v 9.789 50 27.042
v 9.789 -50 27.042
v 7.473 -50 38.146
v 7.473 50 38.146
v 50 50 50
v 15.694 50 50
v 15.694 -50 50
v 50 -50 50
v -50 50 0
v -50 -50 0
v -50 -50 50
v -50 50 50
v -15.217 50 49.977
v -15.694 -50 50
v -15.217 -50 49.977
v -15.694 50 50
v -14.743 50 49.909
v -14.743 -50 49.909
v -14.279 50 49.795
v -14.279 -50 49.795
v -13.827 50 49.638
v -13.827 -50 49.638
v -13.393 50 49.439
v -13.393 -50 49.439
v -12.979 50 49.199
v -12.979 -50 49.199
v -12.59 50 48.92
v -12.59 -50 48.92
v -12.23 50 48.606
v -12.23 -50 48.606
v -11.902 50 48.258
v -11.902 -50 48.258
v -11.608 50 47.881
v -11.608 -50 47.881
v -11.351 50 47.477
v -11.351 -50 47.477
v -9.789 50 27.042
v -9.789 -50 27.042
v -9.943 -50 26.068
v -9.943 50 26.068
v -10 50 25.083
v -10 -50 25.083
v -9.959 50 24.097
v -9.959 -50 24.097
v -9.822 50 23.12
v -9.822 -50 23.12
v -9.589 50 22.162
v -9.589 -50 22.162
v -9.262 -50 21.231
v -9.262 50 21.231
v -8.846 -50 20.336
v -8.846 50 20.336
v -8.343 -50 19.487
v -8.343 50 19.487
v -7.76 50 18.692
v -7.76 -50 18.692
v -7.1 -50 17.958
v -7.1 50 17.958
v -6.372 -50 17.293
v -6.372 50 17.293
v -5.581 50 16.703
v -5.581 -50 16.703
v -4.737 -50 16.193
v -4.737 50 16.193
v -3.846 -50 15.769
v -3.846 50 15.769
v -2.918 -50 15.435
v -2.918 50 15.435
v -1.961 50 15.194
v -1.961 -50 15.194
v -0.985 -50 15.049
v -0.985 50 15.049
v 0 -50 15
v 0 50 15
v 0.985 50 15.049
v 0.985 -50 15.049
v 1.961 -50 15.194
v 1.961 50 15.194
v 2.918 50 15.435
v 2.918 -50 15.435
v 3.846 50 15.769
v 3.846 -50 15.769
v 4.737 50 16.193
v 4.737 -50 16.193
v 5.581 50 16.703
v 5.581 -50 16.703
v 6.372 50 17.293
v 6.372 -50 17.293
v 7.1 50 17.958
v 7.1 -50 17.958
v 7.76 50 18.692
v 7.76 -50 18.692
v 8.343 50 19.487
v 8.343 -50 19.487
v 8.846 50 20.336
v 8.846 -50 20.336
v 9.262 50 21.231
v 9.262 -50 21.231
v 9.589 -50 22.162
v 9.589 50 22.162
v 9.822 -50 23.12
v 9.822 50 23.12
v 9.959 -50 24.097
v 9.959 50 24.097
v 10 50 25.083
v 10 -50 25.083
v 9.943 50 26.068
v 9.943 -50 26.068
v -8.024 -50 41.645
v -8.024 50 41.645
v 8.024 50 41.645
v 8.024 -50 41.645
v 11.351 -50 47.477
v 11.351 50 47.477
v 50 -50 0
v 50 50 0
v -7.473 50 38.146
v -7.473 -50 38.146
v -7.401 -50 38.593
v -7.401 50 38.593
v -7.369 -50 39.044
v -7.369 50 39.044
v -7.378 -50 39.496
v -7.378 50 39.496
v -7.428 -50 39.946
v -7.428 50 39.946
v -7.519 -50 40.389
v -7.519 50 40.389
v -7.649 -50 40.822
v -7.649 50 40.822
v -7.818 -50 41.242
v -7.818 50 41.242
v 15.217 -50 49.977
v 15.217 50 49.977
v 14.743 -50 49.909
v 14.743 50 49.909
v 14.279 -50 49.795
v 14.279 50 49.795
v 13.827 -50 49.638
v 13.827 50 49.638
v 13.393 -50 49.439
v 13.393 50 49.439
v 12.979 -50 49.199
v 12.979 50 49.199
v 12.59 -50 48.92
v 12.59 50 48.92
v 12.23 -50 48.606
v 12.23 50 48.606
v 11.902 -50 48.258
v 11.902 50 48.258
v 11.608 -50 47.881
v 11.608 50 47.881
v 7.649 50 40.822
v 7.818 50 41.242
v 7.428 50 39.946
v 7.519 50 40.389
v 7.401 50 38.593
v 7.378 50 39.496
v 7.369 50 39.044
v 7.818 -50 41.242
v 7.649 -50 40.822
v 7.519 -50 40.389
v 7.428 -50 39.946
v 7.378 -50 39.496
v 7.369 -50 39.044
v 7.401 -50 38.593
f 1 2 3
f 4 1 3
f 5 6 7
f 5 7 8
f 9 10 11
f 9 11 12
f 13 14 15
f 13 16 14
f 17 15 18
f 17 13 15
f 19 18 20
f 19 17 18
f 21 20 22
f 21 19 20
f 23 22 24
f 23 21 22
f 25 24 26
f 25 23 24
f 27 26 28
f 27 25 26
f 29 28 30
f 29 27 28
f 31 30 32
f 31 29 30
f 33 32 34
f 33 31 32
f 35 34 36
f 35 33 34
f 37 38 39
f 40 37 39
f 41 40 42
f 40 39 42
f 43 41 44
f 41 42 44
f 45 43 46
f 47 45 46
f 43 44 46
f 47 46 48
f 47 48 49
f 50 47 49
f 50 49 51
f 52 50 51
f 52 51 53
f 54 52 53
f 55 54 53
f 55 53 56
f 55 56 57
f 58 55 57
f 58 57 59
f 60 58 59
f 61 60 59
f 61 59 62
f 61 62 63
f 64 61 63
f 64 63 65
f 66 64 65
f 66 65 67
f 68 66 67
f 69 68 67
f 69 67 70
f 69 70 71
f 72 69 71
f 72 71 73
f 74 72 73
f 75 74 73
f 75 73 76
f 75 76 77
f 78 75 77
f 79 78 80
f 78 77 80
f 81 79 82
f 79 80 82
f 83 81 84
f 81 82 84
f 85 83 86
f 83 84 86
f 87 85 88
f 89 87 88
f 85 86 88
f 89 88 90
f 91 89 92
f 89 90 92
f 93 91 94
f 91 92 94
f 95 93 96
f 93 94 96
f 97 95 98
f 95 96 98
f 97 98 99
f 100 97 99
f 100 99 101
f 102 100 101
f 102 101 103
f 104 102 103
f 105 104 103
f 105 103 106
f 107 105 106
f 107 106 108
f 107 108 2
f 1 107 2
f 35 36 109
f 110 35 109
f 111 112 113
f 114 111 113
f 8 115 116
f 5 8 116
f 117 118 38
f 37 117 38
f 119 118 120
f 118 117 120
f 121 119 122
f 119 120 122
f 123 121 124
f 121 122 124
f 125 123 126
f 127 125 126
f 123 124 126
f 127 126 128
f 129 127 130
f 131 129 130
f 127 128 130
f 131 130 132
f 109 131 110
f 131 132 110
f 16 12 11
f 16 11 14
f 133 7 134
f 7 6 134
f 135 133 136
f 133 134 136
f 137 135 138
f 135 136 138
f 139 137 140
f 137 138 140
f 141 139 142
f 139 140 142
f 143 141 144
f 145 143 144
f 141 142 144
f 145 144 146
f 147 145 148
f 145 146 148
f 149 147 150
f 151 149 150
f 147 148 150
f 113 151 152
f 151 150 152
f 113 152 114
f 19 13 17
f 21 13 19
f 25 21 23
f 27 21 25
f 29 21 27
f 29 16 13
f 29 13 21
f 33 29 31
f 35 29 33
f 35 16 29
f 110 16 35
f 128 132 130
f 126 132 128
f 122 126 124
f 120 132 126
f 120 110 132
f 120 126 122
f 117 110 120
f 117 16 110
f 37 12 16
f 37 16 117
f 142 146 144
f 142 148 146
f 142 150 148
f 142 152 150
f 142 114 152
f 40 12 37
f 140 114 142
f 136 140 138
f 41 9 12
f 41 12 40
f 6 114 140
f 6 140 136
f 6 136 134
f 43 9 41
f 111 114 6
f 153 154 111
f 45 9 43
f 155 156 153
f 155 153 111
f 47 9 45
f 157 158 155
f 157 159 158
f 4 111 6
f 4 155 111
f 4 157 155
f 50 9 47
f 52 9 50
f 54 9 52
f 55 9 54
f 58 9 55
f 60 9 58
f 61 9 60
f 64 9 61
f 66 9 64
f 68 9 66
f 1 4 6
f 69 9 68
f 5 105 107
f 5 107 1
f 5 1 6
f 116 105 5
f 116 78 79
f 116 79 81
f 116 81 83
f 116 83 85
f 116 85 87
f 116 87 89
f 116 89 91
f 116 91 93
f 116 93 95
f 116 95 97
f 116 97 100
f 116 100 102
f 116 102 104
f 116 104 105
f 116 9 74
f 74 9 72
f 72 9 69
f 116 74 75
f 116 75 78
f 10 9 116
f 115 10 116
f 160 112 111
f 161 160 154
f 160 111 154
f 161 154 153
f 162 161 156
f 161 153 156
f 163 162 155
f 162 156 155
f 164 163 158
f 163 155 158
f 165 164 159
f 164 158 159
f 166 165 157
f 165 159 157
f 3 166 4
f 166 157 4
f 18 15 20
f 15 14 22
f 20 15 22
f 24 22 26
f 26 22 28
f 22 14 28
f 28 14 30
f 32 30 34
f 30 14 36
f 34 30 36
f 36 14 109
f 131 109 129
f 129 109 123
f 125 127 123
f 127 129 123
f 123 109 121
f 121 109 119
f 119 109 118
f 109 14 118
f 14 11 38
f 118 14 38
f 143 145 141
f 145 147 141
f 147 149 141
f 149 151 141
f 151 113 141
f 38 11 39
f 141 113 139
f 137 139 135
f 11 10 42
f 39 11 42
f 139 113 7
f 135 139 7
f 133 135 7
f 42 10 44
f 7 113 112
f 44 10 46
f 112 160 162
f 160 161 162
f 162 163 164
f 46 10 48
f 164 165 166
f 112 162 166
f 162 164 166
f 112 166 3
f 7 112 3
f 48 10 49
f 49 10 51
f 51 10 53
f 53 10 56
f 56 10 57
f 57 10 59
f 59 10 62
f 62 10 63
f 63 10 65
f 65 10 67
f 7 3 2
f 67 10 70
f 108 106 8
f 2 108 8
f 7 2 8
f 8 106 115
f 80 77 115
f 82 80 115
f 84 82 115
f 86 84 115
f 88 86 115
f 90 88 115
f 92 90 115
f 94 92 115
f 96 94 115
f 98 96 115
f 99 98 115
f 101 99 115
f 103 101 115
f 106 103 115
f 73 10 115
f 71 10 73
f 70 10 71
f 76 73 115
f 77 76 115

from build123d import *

# Parameters (mm, degrees)
SKIZZE1_W                       = 100
SKIZZE1_H                       = 100
AUFSATZ_LINEAR_AUSTRAGEN1_DEPTH = 50
SCHNITT_LINEAR_AUSTRAGEN1_DEPTH = 101
VERRUNDUNG1_R                   = 5


with BuildPart() as part:
    # Skizze1 → Aufsatz-Linear austragen1 (new body)
    with BuildSketch(Plane.XY):
        Rectangle(SKIZZE1_W, SKIZZE1_H)
    extrude(amount=AUFSATZ_LINEAR_AUSTRAGEN1_DEPTH)

    # Skizze2 → Schnitt-Linear austragen1 (cut, through all)
    with BuildSketch(Plane.XZ.offset(50)):
        with BuildLine():
            ThreePointArc((-9.789261077, 27.042147785), (0, 15), (9.789261077, 27.042147785))
            Line((9.789261077, 27.042147785), (7.086110247, 40))
            Line((7.086110247, 40), (12.79015, 50))
            Line((12.79015, 50), (-12.79015, 50))
            Line((-12.79015, 50), (-7.086110247, 40))
            Line((-7.086110247, 40), (-9.789261077, 27.042147785))
        make_face()
    extrude(amount=-SCHNITT_LINEAR_AUSTRAGEN1_DEPTH, mode=Mode.SUBTRACT)

    # Verrundung1
    verrundung1_edges = [part.edges().sort_by_distance(p)[0] for p in [
        (-12.79015, 0, 50),
        (12.79015, 0, 50),
        (7.086110247, 0, 40),
        (-7.086110247, 0, 40),
    ]]
    fillet(verrundung1_edges, radius=VERRUNDUNG1_R)


solid = part.part
